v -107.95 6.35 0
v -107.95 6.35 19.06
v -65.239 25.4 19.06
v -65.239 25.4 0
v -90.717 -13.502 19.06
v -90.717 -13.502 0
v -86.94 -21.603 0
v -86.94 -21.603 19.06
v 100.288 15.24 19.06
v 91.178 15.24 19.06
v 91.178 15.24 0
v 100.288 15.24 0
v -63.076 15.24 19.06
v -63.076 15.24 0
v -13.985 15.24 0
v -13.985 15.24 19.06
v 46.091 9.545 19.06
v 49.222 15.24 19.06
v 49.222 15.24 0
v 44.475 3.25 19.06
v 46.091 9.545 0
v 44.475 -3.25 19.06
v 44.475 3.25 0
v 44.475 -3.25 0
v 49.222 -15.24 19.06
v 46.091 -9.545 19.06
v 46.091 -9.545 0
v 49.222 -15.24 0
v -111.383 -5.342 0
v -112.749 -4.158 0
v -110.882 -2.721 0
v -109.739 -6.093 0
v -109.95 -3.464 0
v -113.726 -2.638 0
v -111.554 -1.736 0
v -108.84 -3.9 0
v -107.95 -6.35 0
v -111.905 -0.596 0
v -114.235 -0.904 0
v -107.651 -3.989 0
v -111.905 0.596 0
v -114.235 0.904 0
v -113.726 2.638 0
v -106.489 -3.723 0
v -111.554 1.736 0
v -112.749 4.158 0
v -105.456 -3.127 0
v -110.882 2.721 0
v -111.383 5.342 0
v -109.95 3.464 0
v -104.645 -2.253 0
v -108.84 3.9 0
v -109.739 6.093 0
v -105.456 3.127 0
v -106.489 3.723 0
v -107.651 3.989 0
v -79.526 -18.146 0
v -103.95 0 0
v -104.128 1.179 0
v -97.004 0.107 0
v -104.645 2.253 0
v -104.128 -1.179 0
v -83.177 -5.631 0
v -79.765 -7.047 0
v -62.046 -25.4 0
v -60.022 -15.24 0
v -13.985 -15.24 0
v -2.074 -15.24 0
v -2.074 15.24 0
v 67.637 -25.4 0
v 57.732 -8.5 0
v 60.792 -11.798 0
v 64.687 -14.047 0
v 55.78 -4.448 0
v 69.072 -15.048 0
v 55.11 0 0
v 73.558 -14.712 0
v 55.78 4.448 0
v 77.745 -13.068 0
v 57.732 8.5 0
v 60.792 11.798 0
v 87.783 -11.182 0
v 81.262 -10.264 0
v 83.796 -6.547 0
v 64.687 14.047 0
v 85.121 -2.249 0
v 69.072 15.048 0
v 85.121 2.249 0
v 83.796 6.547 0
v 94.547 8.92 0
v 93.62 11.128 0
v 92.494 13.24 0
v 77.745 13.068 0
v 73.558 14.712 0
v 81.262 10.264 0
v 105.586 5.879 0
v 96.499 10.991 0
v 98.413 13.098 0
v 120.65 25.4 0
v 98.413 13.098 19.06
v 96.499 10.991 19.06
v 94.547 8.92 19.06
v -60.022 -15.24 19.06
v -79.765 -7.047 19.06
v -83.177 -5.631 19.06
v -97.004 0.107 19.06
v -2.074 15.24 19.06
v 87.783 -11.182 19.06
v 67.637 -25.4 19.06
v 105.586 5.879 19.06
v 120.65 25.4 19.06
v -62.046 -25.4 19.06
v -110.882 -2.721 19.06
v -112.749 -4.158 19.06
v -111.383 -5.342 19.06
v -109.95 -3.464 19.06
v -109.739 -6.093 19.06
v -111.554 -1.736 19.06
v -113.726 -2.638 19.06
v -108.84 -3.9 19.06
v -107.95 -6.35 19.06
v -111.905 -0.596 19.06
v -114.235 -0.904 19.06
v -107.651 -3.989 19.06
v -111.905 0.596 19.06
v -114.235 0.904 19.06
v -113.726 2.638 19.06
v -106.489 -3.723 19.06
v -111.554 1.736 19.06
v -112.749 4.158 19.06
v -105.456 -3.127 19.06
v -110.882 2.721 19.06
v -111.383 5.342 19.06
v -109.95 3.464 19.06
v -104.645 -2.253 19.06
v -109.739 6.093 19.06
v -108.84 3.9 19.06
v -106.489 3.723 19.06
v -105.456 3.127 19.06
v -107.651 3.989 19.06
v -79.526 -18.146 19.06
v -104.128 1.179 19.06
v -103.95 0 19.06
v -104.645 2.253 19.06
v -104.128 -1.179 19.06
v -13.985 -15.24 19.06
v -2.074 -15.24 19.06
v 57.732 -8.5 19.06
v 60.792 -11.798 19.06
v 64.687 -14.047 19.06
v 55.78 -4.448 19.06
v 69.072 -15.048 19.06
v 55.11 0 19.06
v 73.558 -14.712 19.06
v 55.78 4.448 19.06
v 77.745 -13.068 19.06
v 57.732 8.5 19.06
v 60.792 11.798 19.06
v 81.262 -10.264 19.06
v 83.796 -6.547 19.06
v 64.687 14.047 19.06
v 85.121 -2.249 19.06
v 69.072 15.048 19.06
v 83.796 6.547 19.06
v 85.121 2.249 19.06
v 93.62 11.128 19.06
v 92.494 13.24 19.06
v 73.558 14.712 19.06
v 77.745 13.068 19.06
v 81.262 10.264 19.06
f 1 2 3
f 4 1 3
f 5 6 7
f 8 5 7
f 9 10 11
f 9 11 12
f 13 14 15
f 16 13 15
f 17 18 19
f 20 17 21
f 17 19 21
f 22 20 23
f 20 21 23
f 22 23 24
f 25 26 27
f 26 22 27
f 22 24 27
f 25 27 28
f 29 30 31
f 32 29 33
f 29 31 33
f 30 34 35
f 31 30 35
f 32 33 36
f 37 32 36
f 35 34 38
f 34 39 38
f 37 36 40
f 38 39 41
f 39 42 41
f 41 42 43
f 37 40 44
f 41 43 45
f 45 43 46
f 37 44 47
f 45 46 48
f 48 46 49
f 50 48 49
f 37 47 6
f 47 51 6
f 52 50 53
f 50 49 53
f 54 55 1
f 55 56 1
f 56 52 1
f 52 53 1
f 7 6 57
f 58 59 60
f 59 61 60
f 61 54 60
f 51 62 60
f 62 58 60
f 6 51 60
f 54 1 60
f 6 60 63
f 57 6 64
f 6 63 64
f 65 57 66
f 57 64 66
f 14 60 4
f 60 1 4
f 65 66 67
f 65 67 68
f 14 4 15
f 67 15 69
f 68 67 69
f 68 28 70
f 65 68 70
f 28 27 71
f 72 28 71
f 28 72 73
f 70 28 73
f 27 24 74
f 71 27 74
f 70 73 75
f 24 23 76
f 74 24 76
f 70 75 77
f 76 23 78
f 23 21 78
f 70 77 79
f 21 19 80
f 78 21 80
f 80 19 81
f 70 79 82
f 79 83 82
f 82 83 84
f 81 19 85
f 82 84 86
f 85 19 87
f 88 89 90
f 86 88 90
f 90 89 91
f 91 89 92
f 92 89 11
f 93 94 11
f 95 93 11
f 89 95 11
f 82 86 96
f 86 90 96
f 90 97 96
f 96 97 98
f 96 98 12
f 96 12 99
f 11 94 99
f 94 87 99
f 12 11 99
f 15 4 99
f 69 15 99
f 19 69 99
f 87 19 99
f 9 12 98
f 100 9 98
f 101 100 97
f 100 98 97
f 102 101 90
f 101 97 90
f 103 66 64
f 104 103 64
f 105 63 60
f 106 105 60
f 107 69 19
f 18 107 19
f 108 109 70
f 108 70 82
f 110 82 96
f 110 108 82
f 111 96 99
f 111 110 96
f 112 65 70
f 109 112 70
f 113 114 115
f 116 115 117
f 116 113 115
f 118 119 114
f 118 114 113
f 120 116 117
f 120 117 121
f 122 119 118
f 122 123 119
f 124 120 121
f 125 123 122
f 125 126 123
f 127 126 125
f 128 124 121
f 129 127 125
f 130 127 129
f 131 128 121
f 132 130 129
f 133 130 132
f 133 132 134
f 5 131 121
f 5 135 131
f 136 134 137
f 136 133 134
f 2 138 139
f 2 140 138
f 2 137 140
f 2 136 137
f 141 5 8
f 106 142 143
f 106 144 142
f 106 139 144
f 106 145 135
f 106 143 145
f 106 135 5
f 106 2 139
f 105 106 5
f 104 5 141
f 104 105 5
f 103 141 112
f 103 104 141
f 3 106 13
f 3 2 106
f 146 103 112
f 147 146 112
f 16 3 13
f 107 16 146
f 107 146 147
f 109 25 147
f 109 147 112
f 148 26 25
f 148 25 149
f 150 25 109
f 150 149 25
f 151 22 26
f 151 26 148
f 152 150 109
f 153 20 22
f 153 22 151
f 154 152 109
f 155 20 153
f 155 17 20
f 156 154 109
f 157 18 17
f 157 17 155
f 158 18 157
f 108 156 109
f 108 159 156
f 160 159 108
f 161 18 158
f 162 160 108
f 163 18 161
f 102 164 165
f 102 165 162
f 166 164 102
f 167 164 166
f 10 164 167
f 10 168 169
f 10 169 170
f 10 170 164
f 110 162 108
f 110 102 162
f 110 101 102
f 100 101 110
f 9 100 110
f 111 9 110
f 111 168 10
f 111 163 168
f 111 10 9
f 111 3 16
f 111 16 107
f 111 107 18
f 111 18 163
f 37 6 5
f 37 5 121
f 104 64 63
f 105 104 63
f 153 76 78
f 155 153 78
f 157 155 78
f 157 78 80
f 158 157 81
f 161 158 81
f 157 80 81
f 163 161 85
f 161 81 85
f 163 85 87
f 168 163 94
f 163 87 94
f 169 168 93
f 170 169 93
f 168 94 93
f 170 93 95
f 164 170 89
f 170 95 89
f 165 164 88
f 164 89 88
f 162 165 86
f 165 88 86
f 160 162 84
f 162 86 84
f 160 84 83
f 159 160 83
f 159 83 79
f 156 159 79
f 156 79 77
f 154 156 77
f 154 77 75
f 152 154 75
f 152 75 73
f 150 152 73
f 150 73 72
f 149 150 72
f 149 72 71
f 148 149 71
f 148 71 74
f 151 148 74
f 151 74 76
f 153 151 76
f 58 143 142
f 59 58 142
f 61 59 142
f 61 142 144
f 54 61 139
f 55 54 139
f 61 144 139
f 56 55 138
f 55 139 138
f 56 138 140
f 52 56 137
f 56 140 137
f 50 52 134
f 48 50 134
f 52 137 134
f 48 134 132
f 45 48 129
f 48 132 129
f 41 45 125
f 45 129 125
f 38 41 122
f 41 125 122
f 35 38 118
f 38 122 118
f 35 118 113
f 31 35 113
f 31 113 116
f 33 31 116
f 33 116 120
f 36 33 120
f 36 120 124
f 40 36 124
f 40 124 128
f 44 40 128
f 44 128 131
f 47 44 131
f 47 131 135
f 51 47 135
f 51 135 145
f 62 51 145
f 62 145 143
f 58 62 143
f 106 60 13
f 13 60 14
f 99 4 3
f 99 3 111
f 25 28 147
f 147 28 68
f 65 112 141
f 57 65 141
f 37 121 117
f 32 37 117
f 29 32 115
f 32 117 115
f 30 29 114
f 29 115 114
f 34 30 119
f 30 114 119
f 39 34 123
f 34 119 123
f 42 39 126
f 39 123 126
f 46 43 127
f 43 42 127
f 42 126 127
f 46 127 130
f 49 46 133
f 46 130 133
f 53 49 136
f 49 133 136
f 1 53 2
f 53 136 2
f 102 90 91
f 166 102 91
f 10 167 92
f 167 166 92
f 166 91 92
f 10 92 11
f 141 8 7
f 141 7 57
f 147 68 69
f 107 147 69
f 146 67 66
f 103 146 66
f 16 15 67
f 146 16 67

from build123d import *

# Parameters (mm, degrees)
SKETCH1_W           = 241.3
SKETCH1_H           = 50.8
BOSS_EXTRUDE1_DEPTH = 19.06
SKETCH3_R           = 4
CUT_EXTRUDE1_DEPTH  = 125.759232524
CUT_EXTRUDE2_DEPTH  = 125.759232524
SKETCH11_R          = 15.09
CUT_EXTRUDE3_DEPTH  = 125.759232524
BOSS_EXTRUDE2_DEPTH = 19.06
CUT_EXTRUDE4_DEPTH  = 125.759232524


with BuildPart() as part:
    # Sketch1 → Boss-Extrude1 (new body)
    with BuildSketch(Plane.XY):
        Rectangle(SKETCH1_W, SKETCH1_H)
    extrude(amount=BOSS_EXTRUDE1_DEPTH)

    # Sketch3 → Cut-Extrude1 (cut, through all)
    with BuildSketch(Plane.XY.offset(19.06)):
        with Locations((-107.95, 0)):
            Circle(SKETCH3_R)
    extrude(amount=-CUT_EXTRUDE1_DEPTH, mode=Mode.SUBTRACT)

    # Sketch5 → Cut-Extrude2 (cut, through all)
    with BuildSketch(Plane.XY.offset(19.06)):
        with BuildLine():
            ThreePointArc((67.637087091, -25.4), (97.003321964, -2.984354021), (120.65, 25.4))
            Line((120.65, 25.4), (120.65, -25.4))
            Line((120.65, -25.4), (67.637087091, -25.4))
        make_face()
        with BuildLine():
            Line((-62.046109456, -25.4), (-107.95, -6.35))
            ThreePointArc((-107.95, -6.35), (-114.3, 0), (-107.95, 6.35))
            Line((-107.95, 6.35), (-65.239311186, 25.4))
            Line((-65.239311186, 25.4), (-120.65, 25.4))
            Line((-120.65, 25.4), (-120.65, -25.4))
            Line((-120.65, -25.4), (-62.046109456, -25.4))
        make_face()
    extrude(amount=-CUT_EXTRUDE2_DEPTH, mode=Mode.SUBTRACT)

    # Sketch11 → Cut-Extrude3 (cut, through all)
    with BuildSketch(Plane(origin=(0, 0, 0), x_dir=(-1, 0, 0), z_dir=(0, 0, -1))):
        with Locations((-70.2, 0)):
            Circle(SKETCH11_R)
    extrude(amount=-CUT_EXTRUDE3_DEPTH, mode=Mode.SUBTRACT)

    # Sketch12 → Boss-Extrude2 (add)
    with BuildSketch(Plane(origin=(0, 0, 0), x_dir=(-1, 0, 0), z_dir=(0, 0, -1))):
        Polygon((86.939525855, -21.602548055), (79.526368634, -18.145736072), (90.717044303, -13.501633601), align=None)
    extrude(amount=-BOSS_EXTRUDE2_DEPTH)

    # Sketch13 → Cut-Extrude4 (cut, through all)
    with BuildSketch(Plane(origin=(0, 0, 0), x_dir=(-1, 0, 0), z_dir=(0, 0, -1))):
        with BuildLine():
            Line((-91.17795532, 15.24), (-100.287694386, 15.24))
            ThreePointArc((-100.287694386, 15.24), (-97.460762969, 12.040493243), (-94.546748719, 8.920091718))
            ThreePointArc((-94.546748719, 8.920091718), (-93.081597611, 12.196913552), (-91.17795532, 15.24))
        make_face()
        Polygon((13.984519796, -15.24), (60.021626843, -15.24), (79.764838161, -7.046616582), (83.177072141, -5.630547997), (97.003760461, 0.107493144), (63.076212362, 15.24), (13.984519796, 15.24), align=None)
        with BuildLine():
            Line((2.07417074, -15.24), (2.07417074, 15.24))
            Line((2.07417074, 15.24), (-49.22204468, 15.24))
            ThreePointArc((-49.22204468, 15.24), (-44.27063037, 0), (-49.22204468, -15.24))
            Line((-49.22204468, -15.24), (2.07417074, -15.24))
        make_face()
    extrude(amount=-CUT_EXTRUDE4_DEPTH, mode=Mode.SUBTRACT)


solid = part.part
